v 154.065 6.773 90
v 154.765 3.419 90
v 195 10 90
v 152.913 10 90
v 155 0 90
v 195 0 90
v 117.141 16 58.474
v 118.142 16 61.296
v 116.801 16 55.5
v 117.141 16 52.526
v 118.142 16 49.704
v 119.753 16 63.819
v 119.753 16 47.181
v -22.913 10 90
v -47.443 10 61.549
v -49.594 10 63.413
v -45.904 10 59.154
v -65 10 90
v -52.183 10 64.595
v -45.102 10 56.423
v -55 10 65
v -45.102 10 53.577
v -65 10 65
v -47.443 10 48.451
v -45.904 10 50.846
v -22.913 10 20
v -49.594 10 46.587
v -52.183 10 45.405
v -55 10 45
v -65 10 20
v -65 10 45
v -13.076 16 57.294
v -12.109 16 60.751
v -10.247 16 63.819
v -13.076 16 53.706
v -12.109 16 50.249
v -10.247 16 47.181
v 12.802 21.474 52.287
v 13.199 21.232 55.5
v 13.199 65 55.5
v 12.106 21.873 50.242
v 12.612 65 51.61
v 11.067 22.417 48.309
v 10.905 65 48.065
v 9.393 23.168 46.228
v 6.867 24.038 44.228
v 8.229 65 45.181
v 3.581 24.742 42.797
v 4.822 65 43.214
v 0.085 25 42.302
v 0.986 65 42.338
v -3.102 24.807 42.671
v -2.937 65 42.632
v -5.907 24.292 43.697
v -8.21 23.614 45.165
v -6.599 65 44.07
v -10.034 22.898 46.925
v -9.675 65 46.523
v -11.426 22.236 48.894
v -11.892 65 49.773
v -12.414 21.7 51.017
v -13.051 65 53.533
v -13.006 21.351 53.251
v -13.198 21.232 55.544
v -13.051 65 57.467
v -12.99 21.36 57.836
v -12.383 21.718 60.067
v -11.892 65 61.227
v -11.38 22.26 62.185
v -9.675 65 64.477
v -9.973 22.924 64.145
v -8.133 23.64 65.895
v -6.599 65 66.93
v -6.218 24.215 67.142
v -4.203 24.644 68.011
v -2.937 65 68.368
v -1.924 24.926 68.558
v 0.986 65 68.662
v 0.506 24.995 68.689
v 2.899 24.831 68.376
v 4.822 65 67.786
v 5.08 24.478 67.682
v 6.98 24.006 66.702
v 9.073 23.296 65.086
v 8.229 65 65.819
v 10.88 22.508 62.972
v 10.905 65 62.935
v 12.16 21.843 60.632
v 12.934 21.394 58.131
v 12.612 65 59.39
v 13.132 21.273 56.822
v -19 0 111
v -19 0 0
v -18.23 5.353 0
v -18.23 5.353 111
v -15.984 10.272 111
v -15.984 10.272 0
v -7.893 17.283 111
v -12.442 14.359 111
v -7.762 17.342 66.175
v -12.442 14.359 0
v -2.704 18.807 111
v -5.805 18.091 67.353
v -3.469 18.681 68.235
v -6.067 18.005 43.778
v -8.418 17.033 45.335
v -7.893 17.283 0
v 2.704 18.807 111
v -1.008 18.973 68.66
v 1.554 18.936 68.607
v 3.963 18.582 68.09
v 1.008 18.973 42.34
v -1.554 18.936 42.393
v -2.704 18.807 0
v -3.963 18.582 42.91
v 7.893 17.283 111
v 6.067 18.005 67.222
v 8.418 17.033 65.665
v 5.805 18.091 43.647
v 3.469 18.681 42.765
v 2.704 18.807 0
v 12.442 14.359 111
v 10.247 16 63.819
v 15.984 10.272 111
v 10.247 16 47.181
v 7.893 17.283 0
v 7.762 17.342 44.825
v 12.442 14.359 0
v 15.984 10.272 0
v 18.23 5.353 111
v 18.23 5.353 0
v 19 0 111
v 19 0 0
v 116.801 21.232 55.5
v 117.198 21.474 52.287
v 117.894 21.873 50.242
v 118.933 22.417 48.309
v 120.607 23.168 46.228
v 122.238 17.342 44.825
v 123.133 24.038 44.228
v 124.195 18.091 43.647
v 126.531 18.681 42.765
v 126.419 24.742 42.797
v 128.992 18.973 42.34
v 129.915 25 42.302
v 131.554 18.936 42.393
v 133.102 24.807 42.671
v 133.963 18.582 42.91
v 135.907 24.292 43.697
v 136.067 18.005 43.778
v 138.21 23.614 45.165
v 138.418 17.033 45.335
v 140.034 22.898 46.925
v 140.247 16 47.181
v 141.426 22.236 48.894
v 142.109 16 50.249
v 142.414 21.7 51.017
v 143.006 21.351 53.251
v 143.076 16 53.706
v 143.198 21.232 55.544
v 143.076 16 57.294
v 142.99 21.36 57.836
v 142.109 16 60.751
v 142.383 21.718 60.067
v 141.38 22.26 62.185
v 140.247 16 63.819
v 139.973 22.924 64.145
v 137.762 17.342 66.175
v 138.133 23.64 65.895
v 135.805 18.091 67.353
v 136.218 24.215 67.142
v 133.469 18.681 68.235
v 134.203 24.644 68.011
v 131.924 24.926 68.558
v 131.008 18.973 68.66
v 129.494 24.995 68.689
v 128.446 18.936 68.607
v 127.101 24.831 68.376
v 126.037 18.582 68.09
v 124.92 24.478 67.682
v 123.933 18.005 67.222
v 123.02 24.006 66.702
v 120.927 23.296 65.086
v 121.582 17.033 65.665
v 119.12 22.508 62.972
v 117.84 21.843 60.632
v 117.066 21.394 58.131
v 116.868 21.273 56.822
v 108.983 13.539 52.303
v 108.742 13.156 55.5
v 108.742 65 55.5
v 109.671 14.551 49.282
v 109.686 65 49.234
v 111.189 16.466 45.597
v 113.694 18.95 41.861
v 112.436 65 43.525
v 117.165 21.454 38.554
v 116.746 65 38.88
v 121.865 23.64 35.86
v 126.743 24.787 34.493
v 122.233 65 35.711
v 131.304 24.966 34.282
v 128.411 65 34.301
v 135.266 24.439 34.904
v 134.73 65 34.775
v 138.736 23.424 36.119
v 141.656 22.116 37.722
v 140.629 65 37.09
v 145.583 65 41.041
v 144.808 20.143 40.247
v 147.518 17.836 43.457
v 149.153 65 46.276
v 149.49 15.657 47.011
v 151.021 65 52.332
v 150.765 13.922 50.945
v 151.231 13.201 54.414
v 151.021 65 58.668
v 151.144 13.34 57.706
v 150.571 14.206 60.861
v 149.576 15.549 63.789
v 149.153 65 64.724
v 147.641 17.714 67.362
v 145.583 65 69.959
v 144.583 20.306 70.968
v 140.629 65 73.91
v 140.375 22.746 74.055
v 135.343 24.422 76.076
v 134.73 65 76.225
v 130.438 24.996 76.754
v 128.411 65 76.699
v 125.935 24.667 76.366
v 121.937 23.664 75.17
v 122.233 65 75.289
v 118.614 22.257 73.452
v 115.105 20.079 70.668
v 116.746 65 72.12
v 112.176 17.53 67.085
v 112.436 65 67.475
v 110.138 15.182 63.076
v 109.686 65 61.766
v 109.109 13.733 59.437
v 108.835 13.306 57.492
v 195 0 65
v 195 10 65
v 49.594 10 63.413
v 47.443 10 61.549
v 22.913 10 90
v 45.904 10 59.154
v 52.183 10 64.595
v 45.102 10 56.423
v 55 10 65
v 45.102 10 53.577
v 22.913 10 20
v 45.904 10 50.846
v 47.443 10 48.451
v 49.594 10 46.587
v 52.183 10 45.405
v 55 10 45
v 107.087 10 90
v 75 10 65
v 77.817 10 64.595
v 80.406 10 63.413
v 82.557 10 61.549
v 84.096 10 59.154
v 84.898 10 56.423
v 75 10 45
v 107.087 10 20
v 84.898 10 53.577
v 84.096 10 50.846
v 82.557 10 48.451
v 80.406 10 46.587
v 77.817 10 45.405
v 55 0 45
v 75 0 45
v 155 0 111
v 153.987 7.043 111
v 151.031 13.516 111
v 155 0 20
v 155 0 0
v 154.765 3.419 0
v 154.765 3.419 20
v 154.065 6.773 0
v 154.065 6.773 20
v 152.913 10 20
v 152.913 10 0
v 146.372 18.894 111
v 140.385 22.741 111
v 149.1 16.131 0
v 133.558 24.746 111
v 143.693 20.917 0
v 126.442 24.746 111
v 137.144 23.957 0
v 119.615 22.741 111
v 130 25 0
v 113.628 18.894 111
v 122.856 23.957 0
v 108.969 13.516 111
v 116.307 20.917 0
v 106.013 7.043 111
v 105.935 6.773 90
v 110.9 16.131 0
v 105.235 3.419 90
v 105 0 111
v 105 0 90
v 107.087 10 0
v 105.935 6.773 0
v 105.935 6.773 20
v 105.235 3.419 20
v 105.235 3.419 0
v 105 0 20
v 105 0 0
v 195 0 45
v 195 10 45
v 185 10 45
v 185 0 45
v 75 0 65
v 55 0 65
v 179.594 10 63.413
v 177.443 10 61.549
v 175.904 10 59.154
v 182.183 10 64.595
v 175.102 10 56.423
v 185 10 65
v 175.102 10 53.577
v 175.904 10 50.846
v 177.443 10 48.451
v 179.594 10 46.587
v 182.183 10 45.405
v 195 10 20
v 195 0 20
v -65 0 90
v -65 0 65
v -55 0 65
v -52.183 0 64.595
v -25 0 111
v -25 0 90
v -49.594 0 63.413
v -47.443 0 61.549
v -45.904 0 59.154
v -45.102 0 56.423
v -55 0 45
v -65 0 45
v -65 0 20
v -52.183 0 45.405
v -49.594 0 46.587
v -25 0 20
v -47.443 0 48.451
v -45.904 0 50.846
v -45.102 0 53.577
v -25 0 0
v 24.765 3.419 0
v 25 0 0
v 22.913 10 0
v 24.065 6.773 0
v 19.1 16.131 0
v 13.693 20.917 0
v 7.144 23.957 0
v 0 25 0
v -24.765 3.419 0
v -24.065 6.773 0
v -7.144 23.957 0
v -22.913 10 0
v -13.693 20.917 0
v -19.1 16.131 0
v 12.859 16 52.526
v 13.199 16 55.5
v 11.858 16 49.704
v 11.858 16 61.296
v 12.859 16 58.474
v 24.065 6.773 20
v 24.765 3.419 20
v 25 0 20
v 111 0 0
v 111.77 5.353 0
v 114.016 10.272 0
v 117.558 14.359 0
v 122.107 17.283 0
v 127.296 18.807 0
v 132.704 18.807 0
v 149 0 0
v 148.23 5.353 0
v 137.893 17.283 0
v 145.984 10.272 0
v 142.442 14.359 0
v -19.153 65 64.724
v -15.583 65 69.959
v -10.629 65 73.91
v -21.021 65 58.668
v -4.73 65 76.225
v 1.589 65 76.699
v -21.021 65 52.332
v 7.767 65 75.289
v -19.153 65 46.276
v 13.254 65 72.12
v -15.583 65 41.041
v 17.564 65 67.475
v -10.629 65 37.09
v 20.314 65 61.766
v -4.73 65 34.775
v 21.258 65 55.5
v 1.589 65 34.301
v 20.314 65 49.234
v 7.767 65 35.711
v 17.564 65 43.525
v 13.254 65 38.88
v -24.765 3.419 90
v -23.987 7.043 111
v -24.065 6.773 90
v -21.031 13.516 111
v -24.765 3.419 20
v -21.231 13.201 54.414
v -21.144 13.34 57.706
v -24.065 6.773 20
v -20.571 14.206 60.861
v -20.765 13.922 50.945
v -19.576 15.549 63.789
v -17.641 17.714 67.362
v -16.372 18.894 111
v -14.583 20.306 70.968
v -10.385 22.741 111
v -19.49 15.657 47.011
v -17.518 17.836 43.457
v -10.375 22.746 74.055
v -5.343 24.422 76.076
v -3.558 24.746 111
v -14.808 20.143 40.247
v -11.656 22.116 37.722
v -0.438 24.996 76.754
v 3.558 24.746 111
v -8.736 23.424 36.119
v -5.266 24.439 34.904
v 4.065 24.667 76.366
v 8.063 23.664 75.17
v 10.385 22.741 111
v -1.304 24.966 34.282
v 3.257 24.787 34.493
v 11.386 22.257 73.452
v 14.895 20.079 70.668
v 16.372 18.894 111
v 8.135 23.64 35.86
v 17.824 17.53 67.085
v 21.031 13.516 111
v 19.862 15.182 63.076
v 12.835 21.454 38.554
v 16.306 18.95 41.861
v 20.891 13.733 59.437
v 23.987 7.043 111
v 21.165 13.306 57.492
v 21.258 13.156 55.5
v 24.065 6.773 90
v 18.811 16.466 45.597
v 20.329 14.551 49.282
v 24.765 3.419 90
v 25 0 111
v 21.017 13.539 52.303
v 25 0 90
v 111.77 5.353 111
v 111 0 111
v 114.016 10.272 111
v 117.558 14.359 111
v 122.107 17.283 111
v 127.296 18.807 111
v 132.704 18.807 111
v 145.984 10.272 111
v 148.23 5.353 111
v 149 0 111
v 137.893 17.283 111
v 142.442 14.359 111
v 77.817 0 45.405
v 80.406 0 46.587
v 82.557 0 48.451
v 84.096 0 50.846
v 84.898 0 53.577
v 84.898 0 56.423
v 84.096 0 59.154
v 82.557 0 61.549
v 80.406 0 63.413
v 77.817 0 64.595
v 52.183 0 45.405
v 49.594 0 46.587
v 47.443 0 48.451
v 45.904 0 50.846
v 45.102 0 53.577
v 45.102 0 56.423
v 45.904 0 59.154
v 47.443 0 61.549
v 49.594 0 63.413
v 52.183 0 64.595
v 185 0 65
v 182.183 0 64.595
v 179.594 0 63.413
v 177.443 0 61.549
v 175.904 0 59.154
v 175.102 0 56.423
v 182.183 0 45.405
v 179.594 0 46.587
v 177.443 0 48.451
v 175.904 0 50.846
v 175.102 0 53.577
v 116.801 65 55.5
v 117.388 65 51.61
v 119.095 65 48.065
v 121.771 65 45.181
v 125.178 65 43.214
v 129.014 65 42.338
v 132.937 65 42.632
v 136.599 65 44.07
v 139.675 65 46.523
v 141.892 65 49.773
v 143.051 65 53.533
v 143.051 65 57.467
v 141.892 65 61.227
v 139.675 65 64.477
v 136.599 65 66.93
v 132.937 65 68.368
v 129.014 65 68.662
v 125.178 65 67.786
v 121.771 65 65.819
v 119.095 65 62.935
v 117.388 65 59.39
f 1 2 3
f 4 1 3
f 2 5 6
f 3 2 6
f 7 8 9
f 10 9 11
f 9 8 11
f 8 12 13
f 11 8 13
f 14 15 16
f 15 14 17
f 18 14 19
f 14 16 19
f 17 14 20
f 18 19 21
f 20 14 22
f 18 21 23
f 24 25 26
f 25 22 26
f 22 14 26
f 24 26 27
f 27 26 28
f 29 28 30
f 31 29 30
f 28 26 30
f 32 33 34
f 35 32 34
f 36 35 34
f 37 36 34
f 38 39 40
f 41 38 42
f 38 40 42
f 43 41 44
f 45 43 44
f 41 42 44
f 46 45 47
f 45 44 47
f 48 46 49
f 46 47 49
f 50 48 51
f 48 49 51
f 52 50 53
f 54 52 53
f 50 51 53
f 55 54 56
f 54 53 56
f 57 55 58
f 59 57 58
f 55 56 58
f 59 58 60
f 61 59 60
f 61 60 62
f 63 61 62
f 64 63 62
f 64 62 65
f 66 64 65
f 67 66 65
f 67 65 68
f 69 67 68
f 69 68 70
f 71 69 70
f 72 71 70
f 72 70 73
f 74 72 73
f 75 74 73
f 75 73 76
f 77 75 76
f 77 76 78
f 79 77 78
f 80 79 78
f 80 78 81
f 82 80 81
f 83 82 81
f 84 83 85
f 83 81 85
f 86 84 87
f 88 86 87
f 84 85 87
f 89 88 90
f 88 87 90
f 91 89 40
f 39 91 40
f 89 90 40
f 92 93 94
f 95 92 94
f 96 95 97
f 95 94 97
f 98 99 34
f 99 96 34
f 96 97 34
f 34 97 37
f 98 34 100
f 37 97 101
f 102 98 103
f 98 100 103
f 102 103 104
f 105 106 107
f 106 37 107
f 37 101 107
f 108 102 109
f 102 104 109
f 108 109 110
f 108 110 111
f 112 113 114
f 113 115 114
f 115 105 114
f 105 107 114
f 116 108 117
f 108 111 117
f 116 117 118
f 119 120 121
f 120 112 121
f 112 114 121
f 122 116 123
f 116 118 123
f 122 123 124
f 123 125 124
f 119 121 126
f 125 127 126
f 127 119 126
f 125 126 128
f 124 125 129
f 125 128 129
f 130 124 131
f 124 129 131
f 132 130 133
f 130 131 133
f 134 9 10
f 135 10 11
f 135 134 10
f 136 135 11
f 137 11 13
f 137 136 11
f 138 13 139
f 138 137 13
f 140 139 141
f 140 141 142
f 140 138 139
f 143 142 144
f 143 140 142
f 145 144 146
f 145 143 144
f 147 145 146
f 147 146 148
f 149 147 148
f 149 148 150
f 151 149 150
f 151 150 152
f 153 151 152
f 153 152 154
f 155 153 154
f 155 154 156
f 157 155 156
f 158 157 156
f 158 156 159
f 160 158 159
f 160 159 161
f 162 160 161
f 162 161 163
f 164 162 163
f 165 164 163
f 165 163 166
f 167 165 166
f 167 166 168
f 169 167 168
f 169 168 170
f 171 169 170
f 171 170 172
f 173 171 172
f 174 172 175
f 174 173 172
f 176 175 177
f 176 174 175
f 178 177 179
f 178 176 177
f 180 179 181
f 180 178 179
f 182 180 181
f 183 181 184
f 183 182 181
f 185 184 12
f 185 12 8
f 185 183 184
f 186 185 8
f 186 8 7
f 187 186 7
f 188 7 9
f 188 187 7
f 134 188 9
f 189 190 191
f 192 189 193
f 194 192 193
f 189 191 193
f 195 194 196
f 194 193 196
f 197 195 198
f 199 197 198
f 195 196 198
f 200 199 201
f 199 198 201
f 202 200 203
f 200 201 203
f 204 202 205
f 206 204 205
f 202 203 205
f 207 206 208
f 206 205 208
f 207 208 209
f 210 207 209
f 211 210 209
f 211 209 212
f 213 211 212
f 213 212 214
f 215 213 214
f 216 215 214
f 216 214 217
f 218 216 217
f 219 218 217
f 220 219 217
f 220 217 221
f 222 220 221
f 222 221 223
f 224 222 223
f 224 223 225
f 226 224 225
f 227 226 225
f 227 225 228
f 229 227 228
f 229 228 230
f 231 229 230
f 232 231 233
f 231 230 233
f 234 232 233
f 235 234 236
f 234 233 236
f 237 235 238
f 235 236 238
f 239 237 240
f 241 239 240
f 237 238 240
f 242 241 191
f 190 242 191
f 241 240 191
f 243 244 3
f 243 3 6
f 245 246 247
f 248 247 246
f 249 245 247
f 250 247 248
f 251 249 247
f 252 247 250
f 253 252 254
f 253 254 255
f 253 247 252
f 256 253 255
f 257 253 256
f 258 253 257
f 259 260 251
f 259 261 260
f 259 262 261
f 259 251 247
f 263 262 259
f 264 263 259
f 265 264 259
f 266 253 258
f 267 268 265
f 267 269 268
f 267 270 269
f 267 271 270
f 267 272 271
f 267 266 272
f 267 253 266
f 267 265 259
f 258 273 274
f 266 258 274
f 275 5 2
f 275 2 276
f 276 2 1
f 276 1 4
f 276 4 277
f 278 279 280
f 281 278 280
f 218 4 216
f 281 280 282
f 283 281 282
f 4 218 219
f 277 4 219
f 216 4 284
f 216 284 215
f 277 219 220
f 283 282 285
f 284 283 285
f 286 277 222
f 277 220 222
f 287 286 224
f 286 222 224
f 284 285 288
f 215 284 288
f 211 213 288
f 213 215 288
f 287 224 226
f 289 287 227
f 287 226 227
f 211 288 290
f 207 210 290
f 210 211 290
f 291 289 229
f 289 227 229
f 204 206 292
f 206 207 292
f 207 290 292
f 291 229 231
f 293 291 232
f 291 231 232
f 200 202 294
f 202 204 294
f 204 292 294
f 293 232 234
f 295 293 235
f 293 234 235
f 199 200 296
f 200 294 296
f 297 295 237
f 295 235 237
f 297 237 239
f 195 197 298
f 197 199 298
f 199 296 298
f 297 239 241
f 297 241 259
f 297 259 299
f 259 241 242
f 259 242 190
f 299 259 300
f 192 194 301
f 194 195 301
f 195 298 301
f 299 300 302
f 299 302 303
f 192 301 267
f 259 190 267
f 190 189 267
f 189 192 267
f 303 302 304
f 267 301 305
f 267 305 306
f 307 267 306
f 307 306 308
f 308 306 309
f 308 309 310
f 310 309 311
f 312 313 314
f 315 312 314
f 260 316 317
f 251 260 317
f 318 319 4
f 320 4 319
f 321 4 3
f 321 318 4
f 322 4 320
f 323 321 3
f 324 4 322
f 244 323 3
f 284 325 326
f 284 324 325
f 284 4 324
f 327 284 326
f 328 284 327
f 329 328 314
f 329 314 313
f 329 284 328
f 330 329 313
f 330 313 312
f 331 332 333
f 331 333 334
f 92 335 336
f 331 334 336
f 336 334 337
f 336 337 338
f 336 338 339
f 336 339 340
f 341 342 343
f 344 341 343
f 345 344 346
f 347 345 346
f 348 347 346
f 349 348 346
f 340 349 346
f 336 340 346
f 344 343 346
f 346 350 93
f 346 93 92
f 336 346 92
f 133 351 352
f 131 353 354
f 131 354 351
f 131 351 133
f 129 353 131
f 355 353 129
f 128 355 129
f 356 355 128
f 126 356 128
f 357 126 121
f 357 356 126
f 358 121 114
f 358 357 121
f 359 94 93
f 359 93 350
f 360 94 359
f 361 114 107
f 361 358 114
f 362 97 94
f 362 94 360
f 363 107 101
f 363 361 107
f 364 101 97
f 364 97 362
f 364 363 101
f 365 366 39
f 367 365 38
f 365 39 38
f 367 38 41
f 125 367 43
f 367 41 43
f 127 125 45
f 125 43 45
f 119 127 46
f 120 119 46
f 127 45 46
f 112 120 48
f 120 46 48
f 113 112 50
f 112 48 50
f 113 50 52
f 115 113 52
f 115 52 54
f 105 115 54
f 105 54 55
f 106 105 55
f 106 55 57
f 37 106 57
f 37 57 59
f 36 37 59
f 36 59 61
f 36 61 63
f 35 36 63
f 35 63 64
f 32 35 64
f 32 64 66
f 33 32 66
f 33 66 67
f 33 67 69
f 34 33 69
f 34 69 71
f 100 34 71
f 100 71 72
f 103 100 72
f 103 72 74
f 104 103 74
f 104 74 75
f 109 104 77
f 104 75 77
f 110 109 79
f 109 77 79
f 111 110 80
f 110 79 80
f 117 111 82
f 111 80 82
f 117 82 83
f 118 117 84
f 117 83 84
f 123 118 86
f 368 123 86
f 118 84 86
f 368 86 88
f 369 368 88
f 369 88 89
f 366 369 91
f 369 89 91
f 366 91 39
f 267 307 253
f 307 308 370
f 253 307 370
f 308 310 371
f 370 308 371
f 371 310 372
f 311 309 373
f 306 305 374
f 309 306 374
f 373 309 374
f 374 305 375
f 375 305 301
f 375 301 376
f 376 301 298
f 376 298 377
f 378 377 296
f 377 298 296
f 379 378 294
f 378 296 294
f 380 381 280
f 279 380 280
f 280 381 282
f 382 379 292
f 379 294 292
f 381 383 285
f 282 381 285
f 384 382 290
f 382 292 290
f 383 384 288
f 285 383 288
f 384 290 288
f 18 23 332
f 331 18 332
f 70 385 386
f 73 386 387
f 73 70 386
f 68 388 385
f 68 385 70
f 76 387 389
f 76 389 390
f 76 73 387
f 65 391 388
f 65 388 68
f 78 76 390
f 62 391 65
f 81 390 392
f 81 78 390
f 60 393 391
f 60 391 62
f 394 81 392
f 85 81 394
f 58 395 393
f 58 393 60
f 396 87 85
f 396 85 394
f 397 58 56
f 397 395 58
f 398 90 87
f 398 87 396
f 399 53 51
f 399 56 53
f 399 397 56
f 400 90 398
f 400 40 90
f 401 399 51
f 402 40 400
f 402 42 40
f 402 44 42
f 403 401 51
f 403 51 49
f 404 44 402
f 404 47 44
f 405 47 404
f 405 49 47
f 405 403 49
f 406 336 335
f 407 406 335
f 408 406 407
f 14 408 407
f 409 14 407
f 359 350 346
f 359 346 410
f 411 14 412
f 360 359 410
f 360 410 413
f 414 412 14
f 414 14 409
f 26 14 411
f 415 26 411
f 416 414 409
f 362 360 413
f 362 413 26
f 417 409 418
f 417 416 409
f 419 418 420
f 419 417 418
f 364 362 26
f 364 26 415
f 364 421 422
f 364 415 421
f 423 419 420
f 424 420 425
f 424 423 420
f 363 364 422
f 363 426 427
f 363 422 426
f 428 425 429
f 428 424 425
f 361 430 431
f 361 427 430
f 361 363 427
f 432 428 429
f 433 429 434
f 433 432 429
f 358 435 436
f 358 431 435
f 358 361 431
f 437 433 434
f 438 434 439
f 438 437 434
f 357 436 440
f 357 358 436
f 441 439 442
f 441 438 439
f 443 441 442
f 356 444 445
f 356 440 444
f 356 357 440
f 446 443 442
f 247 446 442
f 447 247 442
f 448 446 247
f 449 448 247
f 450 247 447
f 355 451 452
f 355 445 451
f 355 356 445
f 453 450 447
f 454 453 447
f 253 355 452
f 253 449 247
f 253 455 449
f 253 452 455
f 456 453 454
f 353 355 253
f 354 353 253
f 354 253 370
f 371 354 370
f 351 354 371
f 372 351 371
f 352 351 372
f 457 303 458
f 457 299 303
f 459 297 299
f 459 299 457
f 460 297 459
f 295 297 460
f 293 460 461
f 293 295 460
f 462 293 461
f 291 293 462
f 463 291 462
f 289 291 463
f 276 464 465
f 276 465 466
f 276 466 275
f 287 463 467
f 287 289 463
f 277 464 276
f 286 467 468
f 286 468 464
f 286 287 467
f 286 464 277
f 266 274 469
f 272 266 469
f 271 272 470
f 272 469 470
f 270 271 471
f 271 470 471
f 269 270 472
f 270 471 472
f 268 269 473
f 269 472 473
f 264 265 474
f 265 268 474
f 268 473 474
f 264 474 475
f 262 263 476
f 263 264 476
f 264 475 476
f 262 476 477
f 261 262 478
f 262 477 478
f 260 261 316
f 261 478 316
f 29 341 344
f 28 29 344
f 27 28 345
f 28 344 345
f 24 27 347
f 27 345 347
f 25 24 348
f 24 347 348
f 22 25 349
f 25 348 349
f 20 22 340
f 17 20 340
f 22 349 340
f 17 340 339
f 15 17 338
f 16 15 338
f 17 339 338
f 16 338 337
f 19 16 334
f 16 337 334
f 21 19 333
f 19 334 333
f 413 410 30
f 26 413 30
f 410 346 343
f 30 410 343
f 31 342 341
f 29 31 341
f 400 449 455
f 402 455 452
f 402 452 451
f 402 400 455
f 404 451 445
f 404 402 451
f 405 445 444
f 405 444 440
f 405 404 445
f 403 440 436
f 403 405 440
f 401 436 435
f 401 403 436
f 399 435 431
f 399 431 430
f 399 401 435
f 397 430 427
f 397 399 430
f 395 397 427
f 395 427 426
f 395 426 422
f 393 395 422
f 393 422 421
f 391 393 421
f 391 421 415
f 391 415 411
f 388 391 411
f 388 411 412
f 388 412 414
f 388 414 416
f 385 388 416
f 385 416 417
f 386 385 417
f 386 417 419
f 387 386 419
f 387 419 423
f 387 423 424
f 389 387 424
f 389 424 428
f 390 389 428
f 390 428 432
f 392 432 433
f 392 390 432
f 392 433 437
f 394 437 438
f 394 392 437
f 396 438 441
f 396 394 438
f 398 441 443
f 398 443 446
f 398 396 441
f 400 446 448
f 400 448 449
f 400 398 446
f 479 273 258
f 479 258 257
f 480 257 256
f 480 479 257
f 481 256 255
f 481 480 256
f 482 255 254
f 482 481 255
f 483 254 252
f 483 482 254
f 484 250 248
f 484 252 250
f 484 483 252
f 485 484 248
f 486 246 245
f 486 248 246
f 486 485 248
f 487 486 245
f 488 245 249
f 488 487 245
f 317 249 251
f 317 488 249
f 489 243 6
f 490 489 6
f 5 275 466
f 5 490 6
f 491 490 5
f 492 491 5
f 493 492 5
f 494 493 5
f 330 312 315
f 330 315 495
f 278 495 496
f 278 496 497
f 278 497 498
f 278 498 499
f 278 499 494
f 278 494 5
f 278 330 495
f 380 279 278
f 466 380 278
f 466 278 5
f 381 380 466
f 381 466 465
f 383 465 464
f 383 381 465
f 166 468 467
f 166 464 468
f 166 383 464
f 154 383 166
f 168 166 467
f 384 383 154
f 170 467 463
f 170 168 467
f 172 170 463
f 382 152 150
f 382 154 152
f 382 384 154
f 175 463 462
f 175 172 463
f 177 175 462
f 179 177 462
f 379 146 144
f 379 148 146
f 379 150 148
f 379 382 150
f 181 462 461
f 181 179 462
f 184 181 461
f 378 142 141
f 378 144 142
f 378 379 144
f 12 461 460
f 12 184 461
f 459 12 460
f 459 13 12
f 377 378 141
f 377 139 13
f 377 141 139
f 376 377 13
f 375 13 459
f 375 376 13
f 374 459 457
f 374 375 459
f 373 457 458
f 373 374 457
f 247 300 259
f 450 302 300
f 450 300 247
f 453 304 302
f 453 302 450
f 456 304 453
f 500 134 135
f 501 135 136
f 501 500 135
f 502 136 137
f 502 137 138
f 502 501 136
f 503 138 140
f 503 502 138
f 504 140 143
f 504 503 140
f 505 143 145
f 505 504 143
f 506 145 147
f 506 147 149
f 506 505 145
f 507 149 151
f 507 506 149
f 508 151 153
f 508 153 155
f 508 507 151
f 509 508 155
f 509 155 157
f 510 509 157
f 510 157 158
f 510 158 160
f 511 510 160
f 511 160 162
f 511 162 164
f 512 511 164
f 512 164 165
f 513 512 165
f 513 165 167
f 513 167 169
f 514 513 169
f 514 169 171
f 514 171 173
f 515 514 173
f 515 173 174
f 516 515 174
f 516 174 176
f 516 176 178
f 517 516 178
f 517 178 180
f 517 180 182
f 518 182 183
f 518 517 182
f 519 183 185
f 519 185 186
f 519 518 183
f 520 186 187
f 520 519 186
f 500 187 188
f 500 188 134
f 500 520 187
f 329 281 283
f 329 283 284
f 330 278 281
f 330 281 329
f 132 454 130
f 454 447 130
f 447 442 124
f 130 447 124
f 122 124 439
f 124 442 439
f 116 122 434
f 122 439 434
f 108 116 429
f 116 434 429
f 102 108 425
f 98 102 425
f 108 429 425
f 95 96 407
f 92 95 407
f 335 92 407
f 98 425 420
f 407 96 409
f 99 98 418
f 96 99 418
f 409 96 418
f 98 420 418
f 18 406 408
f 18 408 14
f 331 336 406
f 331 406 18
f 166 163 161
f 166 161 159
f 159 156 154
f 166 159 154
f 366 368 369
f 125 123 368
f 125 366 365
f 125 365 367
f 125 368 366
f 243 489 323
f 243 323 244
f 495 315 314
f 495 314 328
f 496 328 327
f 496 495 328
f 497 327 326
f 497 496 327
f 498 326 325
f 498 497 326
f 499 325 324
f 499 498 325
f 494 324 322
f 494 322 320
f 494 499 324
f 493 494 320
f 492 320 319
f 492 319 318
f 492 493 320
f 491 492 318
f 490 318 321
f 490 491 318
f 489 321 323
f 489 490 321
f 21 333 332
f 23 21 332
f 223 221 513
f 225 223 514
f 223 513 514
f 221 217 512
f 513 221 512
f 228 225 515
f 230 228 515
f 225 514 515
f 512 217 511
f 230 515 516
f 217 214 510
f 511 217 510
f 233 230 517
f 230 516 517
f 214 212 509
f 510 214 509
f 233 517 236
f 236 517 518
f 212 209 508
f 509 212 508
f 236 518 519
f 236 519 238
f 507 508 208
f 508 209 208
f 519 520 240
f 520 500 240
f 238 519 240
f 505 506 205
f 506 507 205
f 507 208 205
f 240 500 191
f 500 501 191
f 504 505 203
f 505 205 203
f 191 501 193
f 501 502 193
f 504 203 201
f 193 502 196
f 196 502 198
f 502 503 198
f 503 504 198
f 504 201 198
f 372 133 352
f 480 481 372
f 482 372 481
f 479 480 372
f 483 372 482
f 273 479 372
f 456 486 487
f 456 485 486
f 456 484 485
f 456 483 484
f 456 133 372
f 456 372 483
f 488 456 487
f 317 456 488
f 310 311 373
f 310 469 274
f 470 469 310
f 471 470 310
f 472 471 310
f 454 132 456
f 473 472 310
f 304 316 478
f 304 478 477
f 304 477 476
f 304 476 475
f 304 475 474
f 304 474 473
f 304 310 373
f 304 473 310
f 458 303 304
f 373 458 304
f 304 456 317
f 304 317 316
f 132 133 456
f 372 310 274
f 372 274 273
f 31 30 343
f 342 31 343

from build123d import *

# Parameters (mm, degrees)
BOSS_EXTRUDE1_DEPTH      = 110
CUT_EXTRUDE3_START       = -11
SKETCH3_W                = 42.087121525
SKETCH3_H                = 20
CUT_EXTRUDE3_DEPTH       = 27
BOSS_EXTRUDE4_DEPTH      = 20
BOSS_EXTRUDE4_DEPTH_BACK = 91
BOSS_EXTRUDE5_REACH      = 67
SKETCH8_R                = 21.258333205
SKETCH8_R_2              = 13.198570557
SKETCH9_R                = 13.198570557
CUT_EXTRUDE4_DEPTH       = 49


with BuildPart() as part:
    # Sketch2 → Boss-Extrude1 (new body)
    with BuildSketch(Plane.XY):
        with BuildLine():
            Line((-65, 0), (-19, 0))
            ThreePointArc((-19, 0), (0, 19), (19, 0))
            Line((19, 0), (65, 0))
            Line((65, 0), (65, 10))
            Line((65, 10), (22.912878475, 10))
            ThreePointArc((22.912878475, 10), (0, 25), (-22.912878475, 10))
            Line((-22.912878475, 10), (-65, 10))
            Line((-65, 10), (-65, 0))
        make_face()
    extrude(amount=BOSS_EXTRUDE1_DEPTH)

    # Sketch3 → Cut-Extrude3 (cut)
    with BuildSketch(Plane(origin=(0, 10, 0), x_dir=(1, 0, 0), z_dir=(0, 1, 0)).offset(CUT_EXTRUDE3_START)):
        with Locations((43.956439237, -10)):
            Rectangle(SKETCH3_W, SKETCH3_H)
        with BuildLine():
            Line((65, -55), (65, -45))
            Line((65, -45), (55, -45))
            ThreePointArc((55, -45), (45, -55), (55, -65))
            Line((55, -65), (65, -65))
            Line((65, -65), (65, -55))
        make_face()
        with Locations((43.956439237, -100)):
            Rectangle(SKETCH3_W, SKETCH3_H)
    cut_extrude3 = extrude(amount=CUT_EXTRUDE3_DEPTH, mode=Mode.SUBTRACT)

    # Mirror1: Cut-Extrude3 across plane
    add(cut_extrude3.mirror(Plane(origin=(0, 0, 0), x_dir=(0, 0, 1), z_dir=(1, 0, 0))), mode=Mode.SUBTRACT)

    # Sketch7 → Boss-Extrude4 (add, two sides)
    with BuildSketch(Plane(origin=(0, 0, 20), x_dir=(-1, 0, 0), z_dir=(0, 0, -1))) as boss_extrude4_sk:
        with BuildLine():
            Line((-25, 0), (-19, 0))
            ThreePointArc((-19, 0), (0, 19), (19, 0))
            Line((19, 0), (25, 0))
            ThreePointArc((25, 0), (0, 25), (-25, 0))
        make_face()
    extrude(amount=BOSS_EXTRUDE4_DEPTH)
    extrude(boss_extrude4_sk.sketch, amount=-BOSS_EXTRUDE4_DEPTH_BACK)

    # Sketch8 → Boss-Extrude5 (add, up to next)
    with BuildSketch(Plane(origin=(0, 65, 0), x_dir=(1, 0, 0), z_dir=(0, 1, 0)), mode=Mode.PRIVATE) as boss_extrude5_sk1:
        with Locations((0, -55.5)):
            Circle(SKETCH8_R)
        with Locations((0, -55.5)):
            Circle(SKETCH8_R_2, mode=Mode.SUBTRACT)
    boss_extrude5_tool1 = extrude(boss_extrude5_sk1.sketch, amount=-BOSS_EXTRUDE5_REACH, mode=Mode.PRIVATE) - part.part
    add(boss_extrude5_tool1.solids().sort_by_distance((-20.657057, 65, 55.5))[0])

    # Sketch9 → Cut-Extrude4 (cut)
    with BuildSketch(Plane(origin=(0, 65, 0), x_dir=(1, 0, 0), z_dir=(0, 1, 0))):
        with Locations((0, -55.5)):
            Circle(SKETCH9_R)
    extrude(amount=-CUT_EXTRUDE4_DEPTH, mode=Mode.SUBTRACT)

    # Mirror2: part across plane


with BuildPart() as part_1:
    add(part.part)
    add(part.part.mirror(Plane(origin=(65, 0, 0), x_dir=(0, 0, 1), z_dir=(1, 0, 0))))


solid = part_1.part
